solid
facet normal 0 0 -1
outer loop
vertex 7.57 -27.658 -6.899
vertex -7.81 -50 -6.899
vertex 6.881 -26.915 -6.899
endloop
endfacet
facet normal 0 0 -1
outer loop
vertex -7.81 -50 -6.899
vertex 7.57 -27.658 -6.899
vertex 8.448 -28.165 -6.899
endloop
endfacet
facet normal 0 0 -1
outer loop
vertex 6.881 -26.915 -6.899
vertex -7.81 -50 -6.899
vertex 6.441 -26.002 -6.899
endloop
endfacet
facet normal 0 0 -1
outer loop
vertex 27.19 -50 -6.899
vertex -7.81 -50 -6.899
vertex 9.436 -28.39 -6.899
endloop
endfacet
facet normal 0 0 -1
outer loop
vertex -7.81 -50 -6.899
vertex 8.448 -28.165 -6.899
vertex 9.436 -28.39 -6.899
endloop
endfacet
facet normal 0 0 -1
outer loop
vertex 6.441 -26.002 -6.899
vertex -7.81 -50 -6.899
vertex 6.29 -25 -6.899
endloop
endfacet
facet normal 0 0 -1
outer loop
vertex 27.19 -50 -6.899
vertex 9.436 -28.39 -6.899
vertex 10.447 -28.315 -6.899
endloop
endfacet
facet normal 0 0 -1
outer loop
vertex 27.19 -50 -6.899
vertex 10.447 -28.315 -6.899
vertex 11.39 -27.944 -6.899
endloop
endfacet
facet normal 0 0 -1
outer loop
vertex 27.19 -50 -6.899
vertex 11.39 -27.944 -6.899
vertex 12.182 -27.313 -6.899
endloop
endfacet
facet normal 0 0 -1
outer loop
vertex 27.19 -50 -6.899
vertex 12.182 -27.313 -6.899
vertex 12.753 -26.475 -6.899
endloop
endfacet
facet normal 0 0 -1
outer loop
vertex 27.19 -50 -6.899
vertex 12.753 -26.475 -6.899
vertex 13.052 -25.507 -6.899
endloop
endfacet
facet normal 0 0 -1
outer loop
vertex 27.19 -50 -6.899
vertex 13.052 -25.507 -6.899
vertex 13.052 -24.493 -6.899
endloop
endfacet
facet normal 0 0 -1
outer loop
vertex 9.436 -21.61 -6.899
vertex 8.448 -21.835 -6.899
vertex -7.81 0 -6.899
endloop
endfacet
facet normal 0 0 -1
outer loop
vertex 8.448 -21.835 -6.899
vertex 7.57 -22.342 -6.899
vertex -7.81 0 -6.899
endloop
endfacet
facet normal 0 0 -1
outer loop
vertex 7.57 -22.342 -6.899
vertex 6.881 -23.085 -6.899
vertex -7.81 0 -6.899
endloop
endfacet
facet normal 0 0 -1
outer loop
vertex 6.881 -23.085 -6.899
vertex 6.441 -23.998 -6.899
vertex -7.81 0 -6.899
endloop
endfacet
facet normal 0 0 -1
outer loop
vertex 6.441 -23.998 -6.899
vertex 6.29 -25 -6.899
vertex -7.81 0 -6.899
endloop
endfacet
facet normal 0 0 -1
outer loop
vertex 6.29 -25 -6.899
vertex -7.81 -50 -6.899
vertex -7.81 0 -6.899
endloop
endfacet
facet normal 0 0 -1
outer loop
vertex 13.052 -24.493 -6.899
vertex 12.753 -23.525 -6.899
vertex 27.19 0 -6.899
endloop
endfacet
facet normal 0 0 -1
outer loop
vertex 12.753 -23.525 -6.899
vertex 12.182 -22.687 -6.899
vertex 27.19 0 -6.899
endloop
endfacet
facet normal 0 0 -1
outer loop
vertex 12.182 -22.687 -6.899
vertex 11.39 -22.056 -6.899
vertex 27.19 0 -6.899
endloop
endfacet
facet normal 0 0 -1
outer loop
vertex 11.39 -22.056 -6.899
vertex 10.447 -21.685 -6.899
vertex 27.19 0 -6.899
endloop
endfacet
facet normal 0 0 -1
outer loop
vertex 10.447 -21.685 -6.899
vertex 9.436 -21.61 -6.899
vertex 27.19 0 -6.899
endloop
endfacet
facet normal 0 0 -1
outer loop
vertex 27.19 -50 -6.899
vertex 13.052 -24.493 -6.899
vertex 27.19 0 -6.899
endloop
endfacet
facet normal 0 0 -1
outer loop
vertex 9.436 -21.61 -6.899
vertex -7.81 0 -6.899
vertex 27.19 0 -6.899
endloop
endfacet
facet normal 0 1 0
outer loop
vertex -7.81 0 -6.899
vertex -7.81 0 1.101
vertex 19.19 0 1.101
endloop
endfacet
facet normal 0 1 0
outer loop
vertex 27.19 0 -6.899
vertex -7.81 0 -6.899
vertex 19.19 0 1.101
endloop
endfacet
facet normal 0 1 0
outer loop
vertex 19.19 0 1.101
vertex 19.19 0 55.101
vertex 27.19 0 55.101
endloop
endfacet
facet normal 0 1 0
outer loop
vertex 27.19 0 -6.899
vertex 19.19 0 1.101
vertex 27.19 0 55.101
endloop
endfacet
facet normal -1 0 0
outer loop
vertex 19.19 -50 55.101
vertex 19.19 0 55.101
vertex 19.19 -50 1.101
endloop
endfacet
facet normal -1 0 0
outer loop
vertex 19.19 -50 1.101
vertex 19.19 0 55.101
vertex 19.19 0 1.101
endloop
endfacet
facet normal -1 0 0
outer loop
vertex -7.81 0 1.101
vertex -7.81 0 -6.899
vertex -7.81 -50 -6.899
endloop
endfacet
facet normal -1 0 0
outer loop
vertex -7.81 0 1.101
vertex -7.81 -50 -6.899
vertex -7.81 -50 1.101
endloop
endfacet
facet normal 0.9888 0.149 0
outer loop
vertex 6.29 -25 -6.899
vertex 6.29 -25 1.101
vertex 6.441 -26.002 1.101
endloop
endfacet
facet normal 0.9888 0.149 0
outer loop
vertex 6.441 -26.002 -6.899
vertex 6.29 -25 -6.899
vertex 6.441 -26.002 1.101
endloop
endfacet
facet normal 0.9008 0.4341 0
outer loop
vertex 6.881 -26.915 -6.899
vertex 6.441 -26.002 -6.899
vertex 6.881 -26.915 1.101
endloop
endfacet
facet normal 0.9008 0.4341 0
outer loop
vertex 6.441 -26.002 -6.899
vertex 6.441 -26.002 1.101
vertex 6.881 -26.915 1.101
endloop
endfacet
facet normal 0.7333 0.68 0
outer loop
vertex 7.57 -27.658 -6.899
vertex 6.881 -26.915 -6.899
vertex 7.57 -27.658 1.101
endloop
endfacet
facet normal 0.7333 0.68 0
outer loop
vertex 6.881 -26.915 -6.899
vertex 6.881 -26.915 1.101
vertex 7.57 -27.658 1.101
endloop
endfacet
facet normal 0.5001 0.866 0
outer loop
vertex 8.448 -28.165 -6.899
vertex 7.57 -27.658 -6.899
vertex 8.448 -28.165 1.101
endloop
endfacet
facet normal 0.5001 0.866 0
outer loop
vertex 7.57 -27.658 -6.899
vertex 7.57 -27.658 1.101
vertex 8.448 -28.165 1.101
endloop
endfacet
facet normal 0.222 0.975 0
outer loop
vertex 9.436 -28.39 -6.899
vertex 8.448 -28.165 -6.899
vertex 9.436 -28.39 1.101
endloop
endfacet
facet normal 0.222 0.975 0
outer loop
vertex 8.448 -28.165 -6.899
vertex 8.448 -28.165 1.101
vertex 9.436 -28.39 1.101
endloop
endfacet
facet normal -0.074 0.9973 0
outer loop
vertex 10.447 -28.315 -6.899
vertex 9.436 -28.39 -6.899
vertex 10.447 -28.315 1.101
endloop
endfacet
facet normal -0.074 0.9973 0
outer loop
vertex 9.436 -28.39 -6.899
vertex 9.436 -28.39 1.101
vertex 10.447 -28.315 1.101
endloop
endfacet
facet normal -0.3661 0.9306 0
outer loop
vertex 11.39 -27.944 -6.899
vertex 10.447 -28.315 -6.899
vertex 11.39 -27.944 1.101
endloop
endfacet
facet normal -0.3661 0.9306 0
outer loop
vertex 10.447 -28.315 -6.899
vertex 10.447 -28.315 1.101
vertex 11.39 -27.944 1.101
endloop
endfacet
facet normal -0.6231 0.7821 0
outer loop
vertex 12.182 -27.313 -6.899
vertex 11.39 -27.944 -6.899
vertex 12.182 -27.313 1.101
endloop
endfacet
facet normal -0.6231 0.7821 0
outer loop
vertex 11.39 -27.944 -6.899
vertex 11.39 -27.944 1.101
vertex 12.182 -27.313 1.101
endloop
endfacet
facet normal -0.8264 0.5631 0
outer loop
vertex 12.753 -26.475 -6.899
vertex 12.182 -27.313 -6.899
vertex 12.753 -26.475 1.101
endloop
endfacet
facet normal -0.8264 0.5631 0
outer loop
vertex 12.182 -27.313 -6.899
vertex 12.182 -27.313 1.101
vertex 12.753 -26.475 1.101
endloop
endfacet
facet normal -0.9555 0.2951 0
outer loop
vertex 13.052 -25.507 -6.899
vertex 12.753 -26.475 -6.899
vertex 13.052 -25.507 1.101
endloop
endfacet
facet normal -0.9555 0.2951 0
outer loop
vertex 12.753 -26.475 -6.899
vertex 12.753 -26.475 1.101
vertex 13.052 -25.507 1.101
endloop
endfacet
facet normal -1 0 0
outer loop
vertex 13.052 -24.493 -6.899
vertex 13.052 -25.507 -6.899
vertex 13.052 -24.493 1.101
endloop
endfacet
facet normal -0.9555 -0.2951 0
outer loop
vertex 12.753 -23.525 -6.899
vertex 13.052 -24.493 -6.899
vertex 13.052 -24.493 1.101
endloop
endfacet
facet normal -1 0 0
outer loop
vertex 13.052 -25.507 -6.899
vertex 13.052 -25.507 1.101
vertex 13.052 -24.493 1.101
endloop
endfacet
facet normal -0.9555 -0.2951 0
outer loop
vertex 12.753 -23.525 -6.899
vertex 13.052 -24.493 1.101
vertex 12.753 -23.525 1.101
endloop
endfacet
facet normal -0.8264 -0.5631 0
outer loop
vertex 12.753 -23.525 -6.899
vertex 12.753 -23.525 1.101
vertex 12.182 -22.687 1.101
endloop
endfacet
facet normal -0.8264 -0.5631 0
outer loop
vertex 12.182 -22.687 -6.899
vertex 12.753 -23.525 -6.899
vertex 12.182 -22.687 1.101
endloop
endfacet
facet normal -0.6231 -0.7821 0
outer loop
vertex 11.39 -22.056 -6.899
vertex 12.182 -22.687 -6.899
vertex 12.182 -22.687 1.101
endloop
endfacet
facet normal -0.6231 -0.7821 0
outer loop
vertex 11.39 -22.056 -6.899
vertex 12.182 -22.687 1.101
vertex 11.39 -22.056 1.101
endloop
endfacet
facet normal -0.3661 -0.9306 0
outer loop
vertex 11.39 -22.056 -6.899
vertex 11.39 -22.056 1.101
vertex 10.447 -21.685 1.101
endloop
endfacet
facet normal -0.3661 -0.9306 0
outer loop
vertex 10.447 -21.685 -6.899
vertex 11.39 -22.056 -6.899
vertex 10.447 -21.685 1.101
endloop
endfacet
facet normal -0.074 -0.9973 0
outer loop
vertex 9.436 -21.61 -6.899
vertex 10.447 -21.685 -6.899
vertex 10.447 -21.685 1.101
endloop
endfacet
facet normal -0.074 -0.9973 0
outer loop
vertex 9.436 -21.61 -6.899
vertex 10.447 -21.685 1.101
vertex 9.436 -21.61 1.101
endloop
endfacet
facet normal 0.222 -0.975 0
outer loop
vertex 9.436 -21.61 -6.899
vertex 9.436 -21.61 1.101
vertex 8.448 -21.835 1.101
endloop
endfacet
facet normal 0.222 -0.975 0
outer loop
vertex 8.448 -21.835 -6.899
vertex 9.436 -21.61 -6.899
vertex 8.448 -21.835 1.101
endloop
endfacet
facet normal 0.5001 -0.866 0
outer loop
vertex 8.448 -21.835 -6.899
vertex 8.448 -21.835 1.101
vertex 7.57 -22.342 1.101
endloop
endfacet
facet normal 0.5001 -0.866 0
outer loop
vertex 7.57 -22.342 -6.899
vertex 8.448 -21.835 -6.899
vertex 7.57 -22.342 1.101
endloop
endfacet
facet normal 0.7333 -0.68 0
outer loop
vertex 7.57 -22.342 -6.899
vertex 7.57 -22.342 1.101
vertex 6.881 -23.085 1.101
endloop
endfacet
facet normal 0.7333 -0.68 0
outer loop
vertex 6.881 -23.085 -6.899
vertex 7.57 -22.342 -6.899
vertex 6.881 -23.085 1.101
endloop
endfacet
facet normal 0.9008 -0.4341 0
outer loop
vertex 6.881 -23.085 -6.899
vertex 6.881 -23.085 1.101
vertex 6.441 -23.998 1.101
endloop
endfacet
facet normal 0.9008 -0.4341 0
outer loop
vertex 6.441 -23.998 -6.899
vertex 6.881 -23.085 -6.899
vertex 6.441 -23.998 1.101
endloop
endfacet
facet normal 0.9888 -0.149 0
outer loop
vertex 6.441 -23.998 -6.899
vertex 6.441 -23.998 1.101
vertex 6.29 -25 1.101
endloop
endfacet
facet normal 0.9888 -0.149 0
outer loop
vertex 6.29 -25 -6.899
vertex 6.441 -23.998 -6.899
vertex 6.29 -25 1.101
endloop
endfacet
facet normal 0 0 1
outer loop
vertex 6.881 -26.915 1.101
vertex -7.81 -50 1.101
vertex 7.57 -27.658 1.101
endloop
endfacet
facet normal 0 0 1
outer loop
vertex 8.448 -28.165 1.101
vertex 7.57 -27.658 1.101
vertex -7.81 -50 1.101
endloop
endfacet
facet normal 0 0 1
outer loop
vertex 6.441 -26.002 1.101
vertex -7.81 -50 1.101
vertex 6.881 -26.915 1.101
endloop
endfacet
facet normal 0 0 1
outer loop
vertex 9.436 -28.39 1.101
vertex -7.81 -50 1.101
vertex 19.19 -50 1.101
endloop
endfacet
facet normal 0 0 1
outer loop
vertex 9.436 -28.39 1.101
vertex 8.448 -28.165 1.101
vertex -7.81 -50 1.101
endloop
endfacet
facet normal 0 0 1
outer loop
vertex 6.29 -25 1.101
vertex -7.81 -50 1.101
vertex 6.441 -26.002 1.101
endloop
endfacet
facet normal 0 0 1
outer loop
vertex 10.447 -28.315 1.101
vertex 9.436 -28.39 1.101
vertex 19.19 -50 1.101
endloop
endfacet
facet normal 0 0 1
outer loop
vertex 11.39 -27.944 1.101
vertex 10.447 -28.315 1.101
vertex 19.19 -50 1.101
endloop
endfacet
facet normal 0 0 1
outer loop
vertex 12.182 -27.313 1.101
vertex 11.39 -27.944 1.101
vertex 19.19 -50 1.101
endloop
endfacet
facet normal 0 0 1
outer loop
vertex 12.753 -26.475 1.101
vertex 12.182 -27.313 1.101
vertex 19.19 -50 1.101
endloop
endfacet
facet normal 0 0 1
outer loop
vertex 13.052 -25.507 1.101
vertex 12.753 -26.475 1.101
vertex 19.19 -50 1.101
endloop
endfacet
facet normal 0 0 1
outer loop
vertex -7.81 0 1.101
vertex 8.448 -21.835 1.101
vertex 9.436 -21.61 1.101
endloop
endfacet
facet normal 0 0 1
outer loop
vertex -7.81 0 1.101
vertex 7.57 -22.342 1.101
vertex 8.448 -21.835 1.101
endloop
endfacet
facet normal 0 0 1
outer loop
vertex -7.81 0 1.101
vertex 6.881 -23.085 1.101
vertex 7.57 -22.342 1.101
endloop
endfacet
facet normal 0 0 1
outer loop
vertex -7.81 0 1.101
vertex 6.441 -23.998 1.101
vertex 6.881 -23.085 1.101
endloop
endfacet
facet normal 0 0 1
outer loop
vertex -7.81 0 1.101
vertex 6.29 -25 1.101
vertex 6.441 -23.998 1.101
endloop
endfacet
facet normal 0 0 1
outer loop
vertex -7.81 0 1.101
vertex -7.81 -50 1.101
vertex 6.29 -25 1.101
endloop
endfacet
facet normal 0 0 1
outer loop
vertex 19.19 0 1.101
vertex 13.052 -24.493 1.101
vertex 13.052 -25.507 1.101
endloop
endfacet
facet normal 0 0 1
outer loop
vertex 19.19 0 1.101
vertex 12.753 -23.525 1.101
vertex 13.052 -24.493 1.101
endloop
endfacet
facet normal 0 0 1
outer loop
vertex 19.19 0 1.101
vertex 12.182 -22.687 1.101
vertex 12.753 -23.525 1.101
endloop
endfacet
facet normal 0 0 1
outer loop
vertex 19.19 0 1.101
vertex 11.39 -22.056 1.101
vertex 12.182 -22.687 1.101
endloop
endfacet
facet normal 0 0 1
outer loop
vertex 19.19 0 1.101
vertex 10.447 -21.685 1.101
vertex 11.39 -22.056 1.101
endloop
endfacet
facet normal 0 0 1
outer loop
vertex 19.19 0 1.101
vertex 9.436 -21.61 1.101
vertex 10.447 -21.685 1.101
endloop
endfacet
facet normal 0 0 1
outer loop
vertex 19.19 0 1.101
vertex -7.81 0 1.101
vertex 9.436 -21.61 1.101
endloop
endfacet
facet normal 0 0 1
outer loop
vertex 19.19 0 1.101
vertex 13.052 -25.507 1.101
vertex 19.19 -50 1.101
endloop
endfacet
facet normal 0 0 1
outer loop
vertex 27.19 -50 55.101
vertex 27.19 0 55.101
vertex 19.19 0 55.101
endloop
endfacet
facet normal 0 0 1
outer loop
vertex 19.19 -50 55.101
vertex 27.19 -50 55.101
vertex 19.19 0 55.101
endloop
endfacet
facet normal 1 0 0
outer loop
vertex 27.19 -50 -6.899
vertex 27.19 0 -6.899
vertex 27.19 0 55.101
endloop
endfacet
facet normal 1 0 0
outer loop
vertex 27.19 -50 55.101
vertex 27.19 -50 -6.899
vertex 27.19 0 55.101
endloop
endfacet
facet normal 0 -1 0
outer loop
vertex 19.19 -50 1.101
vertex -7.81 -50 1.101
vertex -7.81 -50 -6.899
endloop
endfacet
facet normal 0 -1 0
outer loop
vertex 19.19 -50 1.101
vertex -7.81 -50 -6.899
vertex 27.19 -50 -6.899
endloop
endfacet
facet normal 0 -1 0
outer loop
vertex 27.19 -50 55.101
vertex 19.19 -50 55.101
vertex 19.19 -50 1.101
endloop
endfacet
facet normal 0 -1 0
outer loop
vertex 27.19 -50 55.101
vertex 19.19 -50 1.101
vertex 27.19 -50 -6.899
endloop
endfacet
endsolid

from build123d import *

# Parameters (mm, degrees)
F0_W     = 27
F0_H     = 8
F1_DEPTH = 50
F3_D     = 6.8


with BuildPart() as f1:
    # F0 (on Front) → F1 (new body)
    with BuildSketch(Plane.XZ):
        with Locations((5.6900825575, -2.8987607956)):
            Rectangle(F0_W, F0_H)
        Polygon((19.1900825575, 55.1012392044), (19.1900825575, 1.1012392044), (19.1900825575, -6.8987607956), (27.1900825575, -6.8987607956), (27.1900825575, 55.1012392044), align=None)
    extrude(amount=F1_DEPTH)

    # F3 (through all)
    with Locations(Plane(origin=(0, 0, -6.8987607956), x_dir=(1, 0, 0), z_dir=(0, 0, -1))):
        with Locations((9.6900825575, 25)):
            Hole(F3_D / 2)


solid = f1.part
